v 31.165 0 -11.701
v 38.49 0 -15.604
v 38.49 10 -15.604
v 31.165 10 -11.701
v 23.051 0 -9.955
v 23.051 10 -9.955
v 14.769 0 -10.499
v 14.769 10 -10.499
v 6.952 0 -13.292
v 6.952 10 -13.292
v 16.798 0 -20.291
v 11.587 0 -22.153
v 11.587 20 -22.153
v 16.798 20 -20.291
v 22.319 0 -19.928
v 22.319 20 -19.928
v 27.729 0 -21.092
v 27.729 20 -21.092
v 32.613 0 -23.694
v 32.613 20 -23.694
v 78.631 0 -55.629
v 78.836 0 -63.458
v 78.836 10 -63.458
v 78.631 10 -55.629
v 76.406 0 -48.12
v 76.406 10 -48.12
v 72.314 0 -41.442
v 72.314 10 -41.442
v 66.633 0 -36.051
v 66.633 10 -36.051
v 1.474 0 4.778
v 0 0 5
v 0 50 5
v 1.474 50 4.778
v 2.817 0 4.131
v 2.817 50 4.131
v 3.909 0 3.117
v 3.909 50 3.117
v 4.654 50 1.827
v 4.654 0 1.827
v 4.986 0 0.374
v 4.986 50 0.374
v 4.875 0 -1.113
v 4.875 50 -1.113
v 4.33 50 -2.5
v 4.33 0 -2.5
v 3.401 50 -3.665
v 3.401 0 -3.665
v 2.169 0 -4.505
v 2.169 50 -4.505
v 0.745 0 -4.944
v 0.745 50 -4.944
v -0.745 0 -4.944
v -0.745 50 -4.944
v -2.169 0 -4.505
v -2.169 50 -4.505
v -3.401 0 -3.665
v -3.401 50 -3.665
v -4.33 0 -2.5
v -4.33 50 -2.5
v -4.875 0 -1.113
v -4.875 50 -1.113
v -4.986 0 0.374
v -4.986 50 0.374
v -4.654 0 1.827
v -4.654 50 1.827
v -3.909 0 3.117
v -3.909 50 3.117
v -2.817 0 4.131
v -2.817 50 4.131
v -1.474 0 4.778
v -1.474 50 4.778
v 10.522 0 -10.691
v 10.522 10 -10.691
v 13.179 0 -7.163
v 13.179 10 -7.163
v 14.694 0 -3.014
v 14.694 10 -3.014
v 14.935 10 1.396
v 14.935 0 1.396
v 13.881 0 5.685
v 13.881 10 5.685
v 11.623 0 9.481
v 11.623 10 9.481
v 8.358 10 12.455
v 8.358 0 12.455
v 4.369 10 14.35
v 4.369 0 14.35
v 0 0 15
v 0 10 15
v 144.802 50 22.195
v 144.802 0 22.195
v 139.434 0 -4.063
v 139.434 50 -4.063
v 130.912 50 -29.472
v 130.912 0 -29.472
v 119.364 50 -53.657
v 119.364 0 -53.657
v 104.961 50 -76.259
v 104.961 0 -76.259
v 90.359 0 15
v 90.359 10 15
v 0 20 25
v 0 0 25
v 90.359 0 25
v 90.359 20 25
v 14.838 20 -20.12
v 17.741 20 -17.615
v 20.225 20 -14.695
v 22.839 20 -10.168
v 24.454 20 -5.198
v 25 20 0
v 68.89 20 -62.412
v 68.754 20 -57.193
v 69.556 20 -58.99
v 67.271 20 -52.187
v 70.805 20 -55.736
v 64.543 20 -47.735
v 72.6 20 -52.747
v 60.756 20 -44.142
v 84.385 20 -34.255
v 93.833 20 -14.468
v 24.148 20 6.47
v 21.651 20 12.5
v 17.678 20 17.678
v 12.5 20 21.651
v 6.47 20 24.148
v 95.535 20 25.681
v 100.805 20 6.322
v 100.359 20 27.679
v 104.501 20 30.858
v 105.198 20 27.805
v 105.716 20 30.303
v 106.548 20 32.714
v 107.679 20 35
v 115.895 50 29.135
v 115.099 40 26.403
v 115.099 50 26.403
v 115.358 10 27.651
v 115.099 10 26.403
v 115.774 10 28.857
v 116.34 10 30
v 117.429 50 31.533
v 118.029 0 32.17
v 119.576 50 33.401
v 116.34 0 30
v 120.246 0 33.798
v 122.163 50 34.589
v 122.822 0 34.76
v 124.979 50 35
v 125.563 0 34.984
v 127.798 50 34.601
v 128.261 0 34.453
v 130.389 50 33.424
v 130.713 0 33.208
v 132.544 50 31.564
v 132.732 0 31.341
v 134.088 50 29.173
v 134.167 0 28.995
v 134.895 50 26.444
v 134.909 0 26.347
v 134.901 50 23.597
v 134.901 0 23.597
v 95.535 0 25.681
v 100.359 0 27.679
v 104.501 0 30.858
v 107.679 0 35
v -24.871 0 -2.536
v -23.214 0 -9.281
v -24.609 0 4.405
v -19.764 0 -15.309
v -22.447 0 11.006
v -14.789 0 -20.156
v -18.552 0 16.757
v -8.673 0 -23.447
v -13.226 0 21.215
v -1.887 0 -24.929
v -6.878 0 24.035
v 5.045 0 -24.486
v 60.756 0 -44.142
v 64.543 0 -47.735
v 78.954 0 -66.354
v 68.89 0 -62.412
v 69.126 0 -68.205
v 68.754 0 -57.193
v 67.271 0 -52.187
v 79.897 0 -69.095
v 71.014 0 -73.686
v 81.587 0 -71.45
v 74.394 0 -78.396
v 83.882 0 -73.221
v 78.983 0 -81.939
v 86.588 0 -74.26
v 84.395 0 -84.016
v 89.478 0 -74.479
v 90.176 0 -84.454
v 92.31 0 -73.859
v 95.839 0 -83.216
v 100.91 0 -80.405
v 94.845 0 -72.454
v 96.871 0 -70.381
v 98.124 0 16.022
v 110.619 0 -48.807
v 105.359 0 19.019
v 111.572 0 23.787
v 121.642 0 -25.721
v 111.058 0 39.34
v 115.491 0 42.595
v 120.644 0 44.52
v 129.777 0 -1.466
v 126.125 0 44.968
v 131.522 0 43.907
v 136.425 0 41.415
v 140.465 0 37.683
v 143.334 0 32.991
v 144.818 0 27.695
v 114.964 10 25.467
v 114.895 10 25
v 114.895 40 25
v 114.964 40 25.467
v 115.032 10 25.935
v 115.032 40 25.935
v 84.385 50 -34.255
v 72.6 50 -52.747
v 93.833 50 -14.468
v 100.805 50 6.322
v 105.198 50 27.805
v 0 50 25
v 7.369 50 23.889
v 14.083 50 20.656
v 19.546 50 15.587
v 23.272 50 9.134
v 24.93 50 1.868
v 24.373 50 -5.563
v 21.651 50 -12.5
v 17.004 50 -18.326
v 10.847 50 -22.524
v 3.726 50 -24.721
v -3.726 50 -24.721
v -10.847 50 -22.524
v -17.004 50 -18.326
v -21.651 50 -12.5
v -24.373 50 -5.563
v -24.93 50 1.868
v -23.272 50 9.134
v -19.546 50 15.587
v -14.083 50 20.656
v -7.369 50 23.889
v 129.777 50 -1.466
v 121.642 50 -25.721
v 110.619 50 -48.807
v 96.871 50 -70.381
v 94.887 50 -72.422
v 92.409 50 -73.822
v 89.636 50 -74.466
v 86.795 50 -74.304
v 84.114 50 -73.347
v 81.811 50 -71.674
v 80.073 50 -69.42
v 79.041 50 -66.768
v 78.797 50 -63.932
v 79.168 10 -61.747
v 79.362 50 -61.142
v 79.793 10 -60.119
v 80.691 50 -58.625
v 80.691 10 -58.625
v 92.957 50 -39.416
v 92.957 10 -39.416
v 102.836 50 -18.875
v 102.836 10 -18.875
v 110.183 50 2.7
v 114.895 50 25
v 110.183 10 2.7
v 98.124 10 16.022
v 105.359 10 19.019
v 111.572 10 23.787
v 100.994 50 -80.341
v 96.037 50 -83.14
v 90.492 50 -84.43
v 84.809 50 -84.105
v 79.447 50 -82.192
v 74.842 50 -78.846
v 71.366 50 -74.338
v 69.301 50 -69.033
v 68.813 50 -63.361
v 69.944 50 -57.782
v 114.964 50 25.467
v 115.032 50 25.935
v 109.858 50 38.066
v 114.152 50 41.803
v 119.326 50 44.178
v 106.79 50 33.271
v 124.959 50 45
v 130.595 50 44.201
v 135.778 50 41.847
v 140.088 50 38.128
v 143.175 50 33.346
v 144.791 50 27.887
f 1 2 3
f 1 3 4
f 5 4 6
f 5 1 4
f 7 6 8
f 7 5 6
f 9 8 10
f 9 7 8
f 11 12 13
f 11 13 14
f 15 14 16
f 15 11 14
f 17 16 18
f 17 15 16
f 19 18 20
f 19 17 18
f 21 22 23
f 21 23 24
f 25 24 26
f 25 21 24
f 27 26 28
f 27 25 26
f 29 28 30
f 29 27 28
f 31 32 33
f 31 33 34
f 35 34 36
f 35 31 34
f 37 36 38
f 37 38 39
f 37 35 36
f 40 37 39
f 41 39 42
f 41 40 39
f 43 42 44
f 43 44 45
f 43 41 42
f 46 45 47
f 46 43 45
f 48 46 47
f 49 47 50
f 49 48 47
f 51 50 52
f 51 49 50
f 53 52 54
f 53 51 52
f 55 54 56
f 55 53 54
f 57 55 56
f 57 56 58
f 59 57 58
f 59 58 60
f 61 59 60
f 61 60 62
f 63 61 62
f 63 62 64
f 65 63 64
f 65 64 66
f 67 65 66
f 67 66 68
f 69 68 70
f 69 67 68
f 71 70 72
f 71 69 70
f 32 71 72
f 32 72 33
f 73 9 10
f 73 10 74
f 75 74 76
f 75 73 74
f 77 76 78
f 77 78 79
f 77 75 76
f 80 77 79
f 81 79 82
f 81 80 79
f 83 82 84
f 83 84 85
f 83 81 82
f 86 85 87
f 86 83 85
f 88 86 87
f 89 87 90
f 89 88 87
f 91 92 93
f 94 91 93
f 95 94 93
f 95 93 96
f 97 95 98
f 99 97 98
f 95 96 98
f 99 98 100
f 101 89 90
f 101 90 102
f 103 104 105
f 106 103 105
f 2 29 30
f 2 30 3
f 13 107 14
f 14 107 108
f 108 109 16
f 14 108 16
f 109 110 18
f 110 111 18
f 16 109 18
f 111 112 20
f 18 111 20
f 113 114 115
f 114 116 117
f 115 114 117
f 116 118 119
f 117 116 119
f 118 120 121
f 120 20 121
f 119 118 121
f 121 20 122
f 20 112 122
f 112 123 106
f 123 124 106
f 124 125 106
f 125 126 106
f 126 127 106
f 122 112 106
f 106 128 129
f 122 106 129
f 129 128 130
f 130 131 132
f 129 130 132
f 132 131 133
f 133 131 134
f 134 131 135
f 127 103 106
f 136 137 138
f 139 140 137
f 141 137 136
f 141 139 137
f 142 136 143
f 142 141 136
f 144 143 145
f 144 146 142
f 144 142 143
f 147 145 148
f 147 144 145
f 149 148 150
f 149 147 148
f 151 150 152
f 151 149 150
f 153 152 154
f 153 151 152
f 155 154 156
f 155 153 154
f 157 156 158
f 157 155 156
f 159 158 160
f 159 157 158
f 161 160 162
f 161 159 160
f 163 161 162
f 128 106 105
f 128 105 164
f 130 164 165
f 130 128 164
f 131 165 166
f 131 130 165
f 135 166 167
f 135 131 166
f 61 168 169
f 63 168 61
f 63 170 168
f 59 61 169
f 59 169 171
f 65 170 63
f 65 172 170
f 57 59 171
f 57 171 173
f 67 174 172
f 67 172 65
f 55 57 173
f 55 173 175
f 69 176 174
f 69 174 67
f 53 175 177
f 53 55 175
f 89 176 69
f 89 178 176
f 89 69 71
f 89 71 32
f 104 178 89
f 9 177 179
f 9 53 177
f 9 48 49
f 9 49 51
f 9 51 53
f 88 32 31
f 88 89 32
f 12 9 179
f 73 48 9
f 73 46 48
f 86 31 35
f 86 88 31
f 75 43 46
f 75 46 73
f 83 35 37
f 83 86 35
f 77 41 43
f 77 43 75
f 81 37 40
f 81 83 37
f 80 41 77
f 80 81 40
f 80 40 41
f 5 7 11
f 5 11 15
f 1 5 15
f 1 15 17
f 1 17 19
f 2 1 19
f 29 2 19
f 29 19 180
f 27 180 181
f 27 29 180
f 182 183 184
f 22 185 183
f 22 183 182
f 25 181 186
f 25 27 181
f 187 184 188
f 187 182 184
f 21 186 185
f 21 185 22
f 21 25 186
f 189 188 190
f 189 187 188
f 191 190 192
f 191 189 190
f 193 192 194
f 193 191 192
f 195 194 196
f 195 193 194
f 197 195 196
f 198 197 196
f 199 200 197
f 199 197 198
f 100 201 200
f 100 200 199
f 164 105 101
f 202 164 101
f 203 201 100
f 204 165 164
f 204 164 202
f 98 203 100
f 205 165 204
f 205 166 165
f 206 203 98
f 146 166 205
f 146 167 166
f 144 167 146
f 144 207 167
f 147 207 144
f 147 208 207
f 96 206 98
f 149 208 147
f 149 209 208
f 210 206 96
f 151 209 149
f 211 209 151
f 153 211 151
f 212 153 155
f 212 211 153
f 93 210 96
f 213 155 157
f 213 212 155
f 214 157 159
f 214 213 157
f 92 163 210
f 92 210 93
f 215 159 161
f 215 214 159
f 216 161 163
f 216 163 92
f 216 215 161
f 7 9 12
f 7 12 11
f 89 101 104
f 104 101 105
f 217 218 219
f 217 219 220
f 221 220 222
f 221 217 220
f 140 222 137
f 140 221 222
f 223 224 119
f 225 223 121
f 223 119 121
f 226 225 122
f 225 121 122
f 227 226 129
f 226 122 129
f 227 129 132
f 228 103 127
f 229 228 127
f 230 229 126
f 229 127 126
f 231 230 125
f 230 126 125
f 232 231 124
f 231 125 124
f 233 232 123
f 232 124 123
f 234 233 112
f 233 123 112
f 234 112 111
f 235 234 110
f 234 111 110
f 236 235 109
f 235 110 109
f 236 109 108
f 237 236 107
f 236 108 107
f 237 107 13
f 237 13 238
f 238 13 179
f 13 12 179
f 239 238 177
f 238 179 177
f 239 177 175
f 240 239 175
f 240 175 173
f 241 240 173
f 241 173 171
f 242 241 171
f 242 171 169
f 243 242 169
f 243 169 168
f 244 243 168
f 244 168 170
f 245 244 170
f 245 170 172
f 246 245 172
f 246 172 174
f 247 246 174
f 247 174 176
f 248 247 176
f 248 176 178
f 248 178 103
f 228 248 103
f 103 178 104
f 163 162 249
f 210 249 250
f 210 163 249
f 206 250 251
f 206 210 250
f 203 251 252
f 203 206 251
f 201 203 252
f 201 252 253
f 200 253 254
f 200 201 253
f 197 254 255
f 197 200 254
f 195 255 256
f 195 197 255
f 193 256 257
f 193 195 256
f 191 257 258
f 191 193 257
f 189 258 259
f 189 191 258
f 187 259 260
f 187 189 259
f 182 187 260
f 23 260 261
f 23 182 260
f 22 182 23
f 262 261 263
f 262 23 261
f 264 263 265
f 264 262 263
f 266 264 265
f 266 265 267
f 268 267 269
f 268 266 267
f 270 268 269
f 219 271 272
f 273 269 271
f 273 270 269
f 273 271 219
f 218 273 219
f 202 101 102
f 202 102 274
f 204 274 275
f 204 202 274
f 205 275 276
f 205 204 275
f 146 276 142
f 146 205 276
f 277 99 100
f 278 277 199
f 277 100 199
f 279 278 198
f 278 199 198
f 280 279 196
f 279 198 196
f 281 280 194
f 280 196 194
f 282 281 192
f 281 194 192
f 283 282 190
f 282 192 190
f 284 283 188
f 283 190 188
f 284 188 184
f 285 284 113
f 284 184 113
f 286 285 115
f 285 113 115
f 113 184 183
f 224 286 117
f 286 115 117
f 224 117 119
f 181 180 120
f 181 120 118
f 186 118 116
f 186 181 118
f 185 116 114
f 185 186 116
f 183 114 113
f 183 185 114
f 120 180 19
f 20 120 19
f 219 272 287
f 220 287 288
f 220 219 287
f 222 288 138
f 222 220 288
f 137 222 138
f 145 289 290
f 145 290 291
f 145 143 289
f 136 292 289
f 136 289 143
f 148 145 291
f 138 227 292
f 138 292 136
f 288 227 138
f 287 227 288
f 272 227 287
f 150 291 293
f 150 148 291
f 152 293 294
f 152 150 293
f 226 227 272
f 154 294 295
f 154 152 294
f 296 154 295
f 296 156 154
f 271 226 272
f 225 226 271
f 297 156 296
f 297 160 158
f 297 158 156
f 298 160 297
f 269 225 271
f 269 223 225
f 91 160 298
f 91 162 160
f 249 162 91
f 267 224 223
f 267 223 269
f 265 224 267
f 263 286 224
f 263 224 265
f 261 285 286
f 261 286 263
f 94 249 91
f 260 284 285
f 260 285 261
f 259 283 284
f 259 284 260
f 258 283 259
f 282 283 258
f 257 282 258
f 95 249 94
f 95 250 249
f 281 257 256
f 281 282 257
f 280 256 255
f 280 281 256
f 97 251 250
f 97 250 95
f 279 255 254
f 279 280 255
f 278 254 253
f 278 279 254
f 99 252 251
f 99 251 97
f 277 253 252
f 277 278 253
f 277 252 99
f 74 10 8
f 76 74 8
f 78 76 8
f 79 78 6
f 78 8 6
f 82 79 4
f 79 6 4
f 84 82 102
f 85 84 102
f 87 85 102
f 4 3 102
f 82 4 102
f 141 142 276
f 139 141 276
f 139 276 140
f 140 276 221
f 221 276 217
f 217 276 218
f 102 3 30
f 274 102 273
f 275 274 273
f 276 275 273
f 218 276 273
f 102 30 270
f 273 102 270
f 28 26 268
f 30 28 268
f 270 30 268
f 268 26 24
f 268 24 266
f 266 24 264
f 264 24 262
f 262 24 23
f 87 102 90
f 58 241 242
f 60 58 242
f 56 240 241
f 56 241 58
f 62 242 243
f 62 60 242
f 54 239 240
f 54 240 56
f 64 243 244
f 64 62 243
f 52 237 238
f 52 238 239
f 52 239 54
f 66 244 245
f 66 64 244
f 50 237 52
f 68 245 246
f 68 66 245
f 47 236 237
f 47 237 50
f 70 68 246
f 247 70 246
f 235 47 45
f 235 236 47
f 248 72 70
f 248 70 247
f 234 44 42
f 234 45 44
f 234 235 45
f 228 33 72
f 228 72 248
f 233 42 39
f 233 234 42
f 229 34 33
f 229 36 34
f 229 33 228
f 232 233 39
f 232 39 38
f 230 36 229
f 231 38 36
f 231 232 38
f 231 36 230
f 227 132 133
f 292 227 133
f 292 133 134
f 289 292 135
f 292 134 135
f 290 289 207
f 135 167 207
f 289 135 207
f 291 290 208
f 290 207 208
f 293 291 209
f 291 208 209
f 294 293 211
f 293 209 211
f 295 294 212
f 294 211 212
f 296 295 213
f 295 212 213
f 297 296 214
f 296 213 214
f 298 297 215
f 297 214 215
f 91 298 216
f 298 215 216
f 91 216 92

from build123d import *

# Parameters (mm, degrees)
SKETCH1_R                = 25
SKETCH1_R_2              = 5
BOSS_EXTRUDE1_DEPTH      = 50
BOSS_EXTRUDE4_DEPTH      = 20
BOSS_EXTRUDE5_DEPTH      = 30
BOSS_EXTRUDE5_DEPTH_BACK = 20
FILLET2_R                = 20
SHELL2_DEPTH             = 40
SHELL2_2_DEPTH           = 10
CUT_EXTRUDE2_DEPTH       = 171.486818667
CUT_EXTRUDE2_DEPTH_BACK  = 171.486818667


# Read off the part's stored shape, not the designer's step: Shell2
with BuildPart() as part:
    # Sketch1 → Boss-Extrude1 (new body)
    with BuildSketch(Plane(origin=(0, 0, 0), x_dir=(1, 0, 0), z_dir=(0, 1, 0))):
        with Locations(Location((0, 0, 0), (0, 0, 270))):
            Circle(SKETCH1_R)
        with Locations(Location((0, 0, 0), (0, 0, 270))):
            Circle(SKETCH1_R_2, mode=Mode.SUBTRACT)
    extrude(amount=BOSS_EXTRUDE1_DEPTH)

    # Sketch3 → Boss-Extrude4 (add)
    with BuildSketch(Plane(origin=(0, 0, 0), x_dir=(1, 0, 0), z_dir=(0, 1, 0))):
        with BuildLine():
            Line((0, -25), (125, -25))
            ThreePointArc((125, -25), (112.372583962, 21.969985307), (88.780749417, 64.502990119))
            Line((88.780749417, 64.502990119), (20.225424859, 14.694631307))
            ThreePointArc((20.225424859, 14.694631307), (23.776412907, 7.725424859), (25, 0))
            ThreePointArc((25, 0), (17.67766953, -17.67766953), (0, -25))
        make_face()
    extrude(amount=BOSS_EXTRUDE4_DEPTH)

    # Sketch4 → Boss-Extrude5 (add, two sides: drawn at the far end of the back side and taken through both)
    with BuildSketch(Plane(origin=(0, 20, 0), x_dir=(1, 0, 0), z_dir=(0, 1, 0)).offset(-BOSS_EXTRUDE5_DEPTH_BACK)):
        with BuildLine():
            ThreePointArc((144.802264946, -22.194593966), (130.912107304, 29.472389872), (104.961089304, 76.258695165))
            ThreePointArc((104.961089304, 76.258695165), (77.025044371, 80.683330007), (72.600409529, 52.747285074))
            ThreePointArc((72.600409529, 52.747285074), (93.83306062, 14.467580743), (105.197735054, -27.805406034))
            ThreePointArc((105.197735054, -27.805406034), (127.805406034, -44.802264946), (144.802264946, -22.194593966))
        make_face()
    extrude(amount=BOSS_EXTRUDE5_DEPTH + BOSS_EXTRUDE5_DEPTH_BACK)

    # Fillet2
    # the kernel refuses this fillet: 20 mm, written as the material it adds along each edge
    with BuildSketch(Plane(origin=(20.225424859, 0, -14.694631307), x_dir=(-0.7569254846609251, 0, -0.6535011940852316), z_dir=(0, 1, 0))) as fillet2_piece_1:
        with BuildLine():
            CenterArc((15.977305143, -19.472064177), FILLET2_R, 103.193899981, 63.612200039)
            Line((-3.494759034, -14.90711985), (0, 0))
            ThreePointArc((0, 0), (5.706180408, -0.659919779), (11.412360816, 0))
        make_face()
    extrude(amount=20)
    with BuildSketch(Plane(origin=(104.777715273, 20, 25), x_dir=(-1, 0, 0), z_dir=(0, -1, 0))) as fillet2_piece_2:
        with BuildLine():
            CenterArc((14.418731424, -20), FILLET2_R, 90, 60)
            Line((-2.901776652, -10), (-4.633827459, -9))
            ThreePointArc((-4.633827459, -9), (-2.400246276, -2.524865431), (-1.975559608, 0.311711782))
            Line((-1.975559608, 0.311711782), (0, 2))
            Line((0, 2), (14.418731424, 2))
            Line((14.418731424, 2), (14.418731424, 0))
        make_face()
    extrude(amount=20)
    with BuildSketch(Plane(origin=(72.600409529, 0, -52.747285074), x_dir=(-0.8090169943749511, 0, 0.5877852522924683), z_dir=(0, 1, 0))) as fillet2_piece_3:
        with BuildLine():
            CenterArc((14.641016151, -20), FILLET2_R, 90, 60)
            ThreePointArc((-2.679491924, -10), (-0.681483474, -5.176380902), (0, 0))
            Line((0, 0), (14.641016151, 0))
        make_face()
    extrude(amount=20)

    # Shell2 outline → Shell2 (cut)
    with BuildSketch(Plane(origin=(0, 0, 0), x_dir=(1, 0, 0), z_dir=(0, 1, 0))):
        with BuildLine():
            ThreePointArc((115.098867527, -26.402703017), (126.402703017, -34.901132473), (134.901132473, -23.597296983))
            ThreePointArc((134.901132473, -23.597296983), (121.642345633, 25.721187589), (96.87091936, 70.380842642))
            ThreePointArc((96.87091936, 70.380842642), (82.902896893, 72.593160063), (80.690579473, 58.625137596))
            ThreePointArc((80.690579473, 58.625137596), (103.102822291, 18.218783025), (115.098867527, -26.402703017))
        make_face()
    extrude(amount=SHELL2_DEPTH, mode=Mode.SUBTRACT)

    # Shell2 2 outline → Shell2 2 (cut)
    with BuildSketch(Plane(origin=(0, 0, 0), x_dir=(1, 0, 0), z_dir=(0, 1, 0))):
        with BuildLine():
            ThreePointArc((6.95227087, 13.291573637), (14.566633183, -3.579552727), (0, -15))
            Line((0, -15), (90.358983849, -15))
            ThreePointArc((90.358983849, -15), (105.358983849, -19.019237886), (116.339745962, -30))
            ThreePointArc((116.339745962, -30), (115.546619457, -28.260919549), (115.098867527, -26.402703017))
            ThreePointArc((115.098867527, -26.402703017), (103.102822291, 18.218783025), (80.690579473, 58.625137596))
            ThreePointArc((80.690579473, 58.625137596), (79.444945152, 60.919310624), (78.835530463, 63.457705487))
            ThreePointArc((78.835530463, 63.457705487), (76.406237331, 48.119752296), (66.633431171, 36.051341757))
            Line((66.633431171, 36.051341757), (38.49037018, 15.604211079))
            ThreePointArc((38.49037018, 15.604211079), (23.050773127, 9.955052843), (6.95227087, 13.291573637))
        make_face()
    extrude(amount=SHELL2_2_DEPTH, mode=Mode.SUBTRACT)

    # Sketch4<3> → Cut-Extrude2 (cut, two sides: drawn at the far end of the back side and taken through both)
    with BuildSketch(Plane(origin=(0, 20, 0), x_dir=(1, 0, 0), z_dir=(0, 1, 0)).offset(-CUT_EXTRUDE2_DEPTH_BACK)):
        with BuildLine():
            Line((125, -25), (114.894805022, -25))
            ThreePointArc((114.894805022, -25), (114.998144363, -25.70116121), (115.098867527, -26.402703017))
            ThreePointArc((115.098867527, -26.402703017), (126.402703017, -34.901132473), (134.901132473, -23.597296983))
            ThreePointArc((134.901132473, -23.597296983), (121.642345633, 25.721187589), (96.87091936, 70.380842642))
            ThreePointArc((96.87091936, 70.380842642), (82.902896894, 72.593160063), (80.690579473, 58.625137596))
            Line((80.690579473, 58.625137596), (88.780749417, 64.502990119))
            ThreePointArc((88.780749417, 64.502990119), (112.372583962, 21.969985307), (125, -25))
        make_face()
        with BuildLine():
            ThreePointArc((80.690579473, 58.625137596), (102.835736386, 18.875266979), (114.894805022, -25))
            Line((114.894805022, -25), (125, -25))
            ThreePointArc((125, -25), (112.372583962, 21.969985307), (88.780749417, 64.502990119))
            Line((88.780749417, 64.502990119), (80.690579473, 58.625137596))
        make_face()
    extrude(amount=CUT_EXTRUDE2_DEPTH + CUT_EXTRUDE2_DEPTH_BACK, mode=Mode.SUBTRACT)


solid = part.part
